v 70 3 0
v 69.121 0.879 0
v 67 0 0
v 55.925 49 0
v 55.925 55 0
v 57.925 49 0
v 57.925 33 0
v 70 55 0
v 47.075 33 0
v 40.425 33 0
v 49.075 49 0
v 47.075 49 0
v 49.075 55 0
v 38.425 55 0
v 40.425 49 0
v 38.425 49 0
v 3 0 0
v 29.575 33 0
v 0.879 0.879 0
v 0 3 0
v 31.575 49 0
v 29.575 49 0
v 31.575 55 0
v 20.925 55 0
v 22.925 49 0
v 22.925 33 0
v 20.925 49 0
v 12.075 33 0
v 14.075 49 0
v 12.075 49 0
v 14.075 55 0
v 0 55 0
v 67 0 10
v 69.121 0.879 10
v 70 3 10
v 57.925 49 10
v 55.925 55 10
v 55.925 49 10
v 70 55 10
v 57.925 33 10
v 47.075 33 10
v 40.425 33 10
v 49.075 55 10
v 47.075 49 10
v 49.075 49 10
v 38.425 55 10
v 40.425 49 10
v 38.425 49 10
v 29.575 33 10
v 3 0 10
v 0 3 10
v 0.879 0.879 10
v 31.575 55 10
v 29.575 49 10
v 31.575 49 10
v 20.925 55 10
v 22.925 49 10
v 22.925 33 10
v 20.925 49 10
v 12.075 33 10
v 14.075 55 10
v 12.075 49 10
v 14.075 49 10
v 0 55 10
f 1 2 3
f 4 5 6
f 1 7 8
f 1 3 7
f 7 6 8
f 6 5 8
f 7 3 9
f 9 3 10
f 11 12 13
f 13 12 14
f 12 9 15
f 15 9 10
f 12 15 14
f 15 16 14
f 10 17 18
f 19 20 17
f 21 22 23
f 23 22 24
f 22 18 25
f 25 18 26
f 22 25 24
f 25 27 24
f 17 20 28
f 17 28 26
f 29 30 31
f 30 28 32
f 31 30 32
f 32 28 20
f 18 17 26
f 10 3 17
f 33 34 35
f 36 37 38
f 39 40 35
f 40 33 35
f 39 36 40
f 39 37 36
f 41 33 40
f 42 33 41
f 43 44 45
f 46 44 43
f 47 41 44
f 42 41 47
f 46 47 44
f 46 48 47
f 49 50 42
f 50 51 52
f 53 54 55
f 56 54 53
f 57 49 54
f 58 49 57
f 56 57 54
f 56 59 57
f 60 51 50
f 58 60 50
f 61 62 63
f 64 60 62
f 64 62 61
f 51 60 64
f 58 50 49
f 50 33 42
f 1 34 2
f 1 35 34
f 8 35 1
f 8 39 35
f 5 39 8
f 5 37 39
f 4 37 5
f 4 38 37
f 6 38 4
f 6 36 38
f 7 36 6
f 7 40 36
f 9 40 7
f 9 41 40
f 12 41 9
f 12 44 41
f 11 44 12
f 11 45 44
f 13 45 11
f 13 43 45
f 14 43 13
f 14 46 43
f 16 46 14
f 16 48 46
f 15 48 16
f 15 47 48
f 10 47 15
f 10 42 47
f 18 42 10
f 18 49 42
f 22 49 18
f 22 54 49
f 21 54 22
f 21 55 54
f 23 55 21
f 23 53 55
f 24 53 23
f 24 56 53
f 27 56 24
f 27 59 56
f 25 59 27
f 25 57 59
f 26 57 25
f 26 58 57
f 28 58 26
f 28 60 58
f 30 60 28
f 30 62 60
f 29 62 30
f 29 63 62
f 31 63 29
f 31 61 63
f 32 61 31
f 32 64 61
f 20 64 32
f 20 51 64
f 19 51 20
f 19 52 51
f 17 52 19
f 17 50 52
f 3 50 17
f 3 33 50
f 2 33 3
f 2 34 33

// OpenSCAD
$fn = 32;

// ----------------------------------------------------------------------
// Window plate: 70 x 55 mm, 3 open windows
// ----------------------------------------------------------------------

// --- parameters (mm) ---
profile_height = 10;      // extrusion height
profile_points = 32;      // points of the closed outline

profile = [[0, 3], [0.879, 0.879], [3, 0], [67, 0], [69.121, 0.879], [70, 3], [70, 55], [55.925, 55], [55.925, 49], [57.925, 49], [57.925, 33], [47.075, 33], [47.075, 49], [49.075, 49], [49.075, 55], [38.425, 55], [38.425, 49], [40.425, 49], [40.425, 33], [29.575, 33], [29.575, 49], [31.575, 49], [31.575, 55], [20.925, 55], [20.925, 49], [22.925, 49], [22.925, 33], [12.075, 33], [12.075, 49], [14.075, 49], [14.075, 55], [0, 55]];  // single closed polygon, 32 points, counter clockwise

// --- the one profile operation ---
linear_extrude(height = profile_height) polygon(points = profile);
